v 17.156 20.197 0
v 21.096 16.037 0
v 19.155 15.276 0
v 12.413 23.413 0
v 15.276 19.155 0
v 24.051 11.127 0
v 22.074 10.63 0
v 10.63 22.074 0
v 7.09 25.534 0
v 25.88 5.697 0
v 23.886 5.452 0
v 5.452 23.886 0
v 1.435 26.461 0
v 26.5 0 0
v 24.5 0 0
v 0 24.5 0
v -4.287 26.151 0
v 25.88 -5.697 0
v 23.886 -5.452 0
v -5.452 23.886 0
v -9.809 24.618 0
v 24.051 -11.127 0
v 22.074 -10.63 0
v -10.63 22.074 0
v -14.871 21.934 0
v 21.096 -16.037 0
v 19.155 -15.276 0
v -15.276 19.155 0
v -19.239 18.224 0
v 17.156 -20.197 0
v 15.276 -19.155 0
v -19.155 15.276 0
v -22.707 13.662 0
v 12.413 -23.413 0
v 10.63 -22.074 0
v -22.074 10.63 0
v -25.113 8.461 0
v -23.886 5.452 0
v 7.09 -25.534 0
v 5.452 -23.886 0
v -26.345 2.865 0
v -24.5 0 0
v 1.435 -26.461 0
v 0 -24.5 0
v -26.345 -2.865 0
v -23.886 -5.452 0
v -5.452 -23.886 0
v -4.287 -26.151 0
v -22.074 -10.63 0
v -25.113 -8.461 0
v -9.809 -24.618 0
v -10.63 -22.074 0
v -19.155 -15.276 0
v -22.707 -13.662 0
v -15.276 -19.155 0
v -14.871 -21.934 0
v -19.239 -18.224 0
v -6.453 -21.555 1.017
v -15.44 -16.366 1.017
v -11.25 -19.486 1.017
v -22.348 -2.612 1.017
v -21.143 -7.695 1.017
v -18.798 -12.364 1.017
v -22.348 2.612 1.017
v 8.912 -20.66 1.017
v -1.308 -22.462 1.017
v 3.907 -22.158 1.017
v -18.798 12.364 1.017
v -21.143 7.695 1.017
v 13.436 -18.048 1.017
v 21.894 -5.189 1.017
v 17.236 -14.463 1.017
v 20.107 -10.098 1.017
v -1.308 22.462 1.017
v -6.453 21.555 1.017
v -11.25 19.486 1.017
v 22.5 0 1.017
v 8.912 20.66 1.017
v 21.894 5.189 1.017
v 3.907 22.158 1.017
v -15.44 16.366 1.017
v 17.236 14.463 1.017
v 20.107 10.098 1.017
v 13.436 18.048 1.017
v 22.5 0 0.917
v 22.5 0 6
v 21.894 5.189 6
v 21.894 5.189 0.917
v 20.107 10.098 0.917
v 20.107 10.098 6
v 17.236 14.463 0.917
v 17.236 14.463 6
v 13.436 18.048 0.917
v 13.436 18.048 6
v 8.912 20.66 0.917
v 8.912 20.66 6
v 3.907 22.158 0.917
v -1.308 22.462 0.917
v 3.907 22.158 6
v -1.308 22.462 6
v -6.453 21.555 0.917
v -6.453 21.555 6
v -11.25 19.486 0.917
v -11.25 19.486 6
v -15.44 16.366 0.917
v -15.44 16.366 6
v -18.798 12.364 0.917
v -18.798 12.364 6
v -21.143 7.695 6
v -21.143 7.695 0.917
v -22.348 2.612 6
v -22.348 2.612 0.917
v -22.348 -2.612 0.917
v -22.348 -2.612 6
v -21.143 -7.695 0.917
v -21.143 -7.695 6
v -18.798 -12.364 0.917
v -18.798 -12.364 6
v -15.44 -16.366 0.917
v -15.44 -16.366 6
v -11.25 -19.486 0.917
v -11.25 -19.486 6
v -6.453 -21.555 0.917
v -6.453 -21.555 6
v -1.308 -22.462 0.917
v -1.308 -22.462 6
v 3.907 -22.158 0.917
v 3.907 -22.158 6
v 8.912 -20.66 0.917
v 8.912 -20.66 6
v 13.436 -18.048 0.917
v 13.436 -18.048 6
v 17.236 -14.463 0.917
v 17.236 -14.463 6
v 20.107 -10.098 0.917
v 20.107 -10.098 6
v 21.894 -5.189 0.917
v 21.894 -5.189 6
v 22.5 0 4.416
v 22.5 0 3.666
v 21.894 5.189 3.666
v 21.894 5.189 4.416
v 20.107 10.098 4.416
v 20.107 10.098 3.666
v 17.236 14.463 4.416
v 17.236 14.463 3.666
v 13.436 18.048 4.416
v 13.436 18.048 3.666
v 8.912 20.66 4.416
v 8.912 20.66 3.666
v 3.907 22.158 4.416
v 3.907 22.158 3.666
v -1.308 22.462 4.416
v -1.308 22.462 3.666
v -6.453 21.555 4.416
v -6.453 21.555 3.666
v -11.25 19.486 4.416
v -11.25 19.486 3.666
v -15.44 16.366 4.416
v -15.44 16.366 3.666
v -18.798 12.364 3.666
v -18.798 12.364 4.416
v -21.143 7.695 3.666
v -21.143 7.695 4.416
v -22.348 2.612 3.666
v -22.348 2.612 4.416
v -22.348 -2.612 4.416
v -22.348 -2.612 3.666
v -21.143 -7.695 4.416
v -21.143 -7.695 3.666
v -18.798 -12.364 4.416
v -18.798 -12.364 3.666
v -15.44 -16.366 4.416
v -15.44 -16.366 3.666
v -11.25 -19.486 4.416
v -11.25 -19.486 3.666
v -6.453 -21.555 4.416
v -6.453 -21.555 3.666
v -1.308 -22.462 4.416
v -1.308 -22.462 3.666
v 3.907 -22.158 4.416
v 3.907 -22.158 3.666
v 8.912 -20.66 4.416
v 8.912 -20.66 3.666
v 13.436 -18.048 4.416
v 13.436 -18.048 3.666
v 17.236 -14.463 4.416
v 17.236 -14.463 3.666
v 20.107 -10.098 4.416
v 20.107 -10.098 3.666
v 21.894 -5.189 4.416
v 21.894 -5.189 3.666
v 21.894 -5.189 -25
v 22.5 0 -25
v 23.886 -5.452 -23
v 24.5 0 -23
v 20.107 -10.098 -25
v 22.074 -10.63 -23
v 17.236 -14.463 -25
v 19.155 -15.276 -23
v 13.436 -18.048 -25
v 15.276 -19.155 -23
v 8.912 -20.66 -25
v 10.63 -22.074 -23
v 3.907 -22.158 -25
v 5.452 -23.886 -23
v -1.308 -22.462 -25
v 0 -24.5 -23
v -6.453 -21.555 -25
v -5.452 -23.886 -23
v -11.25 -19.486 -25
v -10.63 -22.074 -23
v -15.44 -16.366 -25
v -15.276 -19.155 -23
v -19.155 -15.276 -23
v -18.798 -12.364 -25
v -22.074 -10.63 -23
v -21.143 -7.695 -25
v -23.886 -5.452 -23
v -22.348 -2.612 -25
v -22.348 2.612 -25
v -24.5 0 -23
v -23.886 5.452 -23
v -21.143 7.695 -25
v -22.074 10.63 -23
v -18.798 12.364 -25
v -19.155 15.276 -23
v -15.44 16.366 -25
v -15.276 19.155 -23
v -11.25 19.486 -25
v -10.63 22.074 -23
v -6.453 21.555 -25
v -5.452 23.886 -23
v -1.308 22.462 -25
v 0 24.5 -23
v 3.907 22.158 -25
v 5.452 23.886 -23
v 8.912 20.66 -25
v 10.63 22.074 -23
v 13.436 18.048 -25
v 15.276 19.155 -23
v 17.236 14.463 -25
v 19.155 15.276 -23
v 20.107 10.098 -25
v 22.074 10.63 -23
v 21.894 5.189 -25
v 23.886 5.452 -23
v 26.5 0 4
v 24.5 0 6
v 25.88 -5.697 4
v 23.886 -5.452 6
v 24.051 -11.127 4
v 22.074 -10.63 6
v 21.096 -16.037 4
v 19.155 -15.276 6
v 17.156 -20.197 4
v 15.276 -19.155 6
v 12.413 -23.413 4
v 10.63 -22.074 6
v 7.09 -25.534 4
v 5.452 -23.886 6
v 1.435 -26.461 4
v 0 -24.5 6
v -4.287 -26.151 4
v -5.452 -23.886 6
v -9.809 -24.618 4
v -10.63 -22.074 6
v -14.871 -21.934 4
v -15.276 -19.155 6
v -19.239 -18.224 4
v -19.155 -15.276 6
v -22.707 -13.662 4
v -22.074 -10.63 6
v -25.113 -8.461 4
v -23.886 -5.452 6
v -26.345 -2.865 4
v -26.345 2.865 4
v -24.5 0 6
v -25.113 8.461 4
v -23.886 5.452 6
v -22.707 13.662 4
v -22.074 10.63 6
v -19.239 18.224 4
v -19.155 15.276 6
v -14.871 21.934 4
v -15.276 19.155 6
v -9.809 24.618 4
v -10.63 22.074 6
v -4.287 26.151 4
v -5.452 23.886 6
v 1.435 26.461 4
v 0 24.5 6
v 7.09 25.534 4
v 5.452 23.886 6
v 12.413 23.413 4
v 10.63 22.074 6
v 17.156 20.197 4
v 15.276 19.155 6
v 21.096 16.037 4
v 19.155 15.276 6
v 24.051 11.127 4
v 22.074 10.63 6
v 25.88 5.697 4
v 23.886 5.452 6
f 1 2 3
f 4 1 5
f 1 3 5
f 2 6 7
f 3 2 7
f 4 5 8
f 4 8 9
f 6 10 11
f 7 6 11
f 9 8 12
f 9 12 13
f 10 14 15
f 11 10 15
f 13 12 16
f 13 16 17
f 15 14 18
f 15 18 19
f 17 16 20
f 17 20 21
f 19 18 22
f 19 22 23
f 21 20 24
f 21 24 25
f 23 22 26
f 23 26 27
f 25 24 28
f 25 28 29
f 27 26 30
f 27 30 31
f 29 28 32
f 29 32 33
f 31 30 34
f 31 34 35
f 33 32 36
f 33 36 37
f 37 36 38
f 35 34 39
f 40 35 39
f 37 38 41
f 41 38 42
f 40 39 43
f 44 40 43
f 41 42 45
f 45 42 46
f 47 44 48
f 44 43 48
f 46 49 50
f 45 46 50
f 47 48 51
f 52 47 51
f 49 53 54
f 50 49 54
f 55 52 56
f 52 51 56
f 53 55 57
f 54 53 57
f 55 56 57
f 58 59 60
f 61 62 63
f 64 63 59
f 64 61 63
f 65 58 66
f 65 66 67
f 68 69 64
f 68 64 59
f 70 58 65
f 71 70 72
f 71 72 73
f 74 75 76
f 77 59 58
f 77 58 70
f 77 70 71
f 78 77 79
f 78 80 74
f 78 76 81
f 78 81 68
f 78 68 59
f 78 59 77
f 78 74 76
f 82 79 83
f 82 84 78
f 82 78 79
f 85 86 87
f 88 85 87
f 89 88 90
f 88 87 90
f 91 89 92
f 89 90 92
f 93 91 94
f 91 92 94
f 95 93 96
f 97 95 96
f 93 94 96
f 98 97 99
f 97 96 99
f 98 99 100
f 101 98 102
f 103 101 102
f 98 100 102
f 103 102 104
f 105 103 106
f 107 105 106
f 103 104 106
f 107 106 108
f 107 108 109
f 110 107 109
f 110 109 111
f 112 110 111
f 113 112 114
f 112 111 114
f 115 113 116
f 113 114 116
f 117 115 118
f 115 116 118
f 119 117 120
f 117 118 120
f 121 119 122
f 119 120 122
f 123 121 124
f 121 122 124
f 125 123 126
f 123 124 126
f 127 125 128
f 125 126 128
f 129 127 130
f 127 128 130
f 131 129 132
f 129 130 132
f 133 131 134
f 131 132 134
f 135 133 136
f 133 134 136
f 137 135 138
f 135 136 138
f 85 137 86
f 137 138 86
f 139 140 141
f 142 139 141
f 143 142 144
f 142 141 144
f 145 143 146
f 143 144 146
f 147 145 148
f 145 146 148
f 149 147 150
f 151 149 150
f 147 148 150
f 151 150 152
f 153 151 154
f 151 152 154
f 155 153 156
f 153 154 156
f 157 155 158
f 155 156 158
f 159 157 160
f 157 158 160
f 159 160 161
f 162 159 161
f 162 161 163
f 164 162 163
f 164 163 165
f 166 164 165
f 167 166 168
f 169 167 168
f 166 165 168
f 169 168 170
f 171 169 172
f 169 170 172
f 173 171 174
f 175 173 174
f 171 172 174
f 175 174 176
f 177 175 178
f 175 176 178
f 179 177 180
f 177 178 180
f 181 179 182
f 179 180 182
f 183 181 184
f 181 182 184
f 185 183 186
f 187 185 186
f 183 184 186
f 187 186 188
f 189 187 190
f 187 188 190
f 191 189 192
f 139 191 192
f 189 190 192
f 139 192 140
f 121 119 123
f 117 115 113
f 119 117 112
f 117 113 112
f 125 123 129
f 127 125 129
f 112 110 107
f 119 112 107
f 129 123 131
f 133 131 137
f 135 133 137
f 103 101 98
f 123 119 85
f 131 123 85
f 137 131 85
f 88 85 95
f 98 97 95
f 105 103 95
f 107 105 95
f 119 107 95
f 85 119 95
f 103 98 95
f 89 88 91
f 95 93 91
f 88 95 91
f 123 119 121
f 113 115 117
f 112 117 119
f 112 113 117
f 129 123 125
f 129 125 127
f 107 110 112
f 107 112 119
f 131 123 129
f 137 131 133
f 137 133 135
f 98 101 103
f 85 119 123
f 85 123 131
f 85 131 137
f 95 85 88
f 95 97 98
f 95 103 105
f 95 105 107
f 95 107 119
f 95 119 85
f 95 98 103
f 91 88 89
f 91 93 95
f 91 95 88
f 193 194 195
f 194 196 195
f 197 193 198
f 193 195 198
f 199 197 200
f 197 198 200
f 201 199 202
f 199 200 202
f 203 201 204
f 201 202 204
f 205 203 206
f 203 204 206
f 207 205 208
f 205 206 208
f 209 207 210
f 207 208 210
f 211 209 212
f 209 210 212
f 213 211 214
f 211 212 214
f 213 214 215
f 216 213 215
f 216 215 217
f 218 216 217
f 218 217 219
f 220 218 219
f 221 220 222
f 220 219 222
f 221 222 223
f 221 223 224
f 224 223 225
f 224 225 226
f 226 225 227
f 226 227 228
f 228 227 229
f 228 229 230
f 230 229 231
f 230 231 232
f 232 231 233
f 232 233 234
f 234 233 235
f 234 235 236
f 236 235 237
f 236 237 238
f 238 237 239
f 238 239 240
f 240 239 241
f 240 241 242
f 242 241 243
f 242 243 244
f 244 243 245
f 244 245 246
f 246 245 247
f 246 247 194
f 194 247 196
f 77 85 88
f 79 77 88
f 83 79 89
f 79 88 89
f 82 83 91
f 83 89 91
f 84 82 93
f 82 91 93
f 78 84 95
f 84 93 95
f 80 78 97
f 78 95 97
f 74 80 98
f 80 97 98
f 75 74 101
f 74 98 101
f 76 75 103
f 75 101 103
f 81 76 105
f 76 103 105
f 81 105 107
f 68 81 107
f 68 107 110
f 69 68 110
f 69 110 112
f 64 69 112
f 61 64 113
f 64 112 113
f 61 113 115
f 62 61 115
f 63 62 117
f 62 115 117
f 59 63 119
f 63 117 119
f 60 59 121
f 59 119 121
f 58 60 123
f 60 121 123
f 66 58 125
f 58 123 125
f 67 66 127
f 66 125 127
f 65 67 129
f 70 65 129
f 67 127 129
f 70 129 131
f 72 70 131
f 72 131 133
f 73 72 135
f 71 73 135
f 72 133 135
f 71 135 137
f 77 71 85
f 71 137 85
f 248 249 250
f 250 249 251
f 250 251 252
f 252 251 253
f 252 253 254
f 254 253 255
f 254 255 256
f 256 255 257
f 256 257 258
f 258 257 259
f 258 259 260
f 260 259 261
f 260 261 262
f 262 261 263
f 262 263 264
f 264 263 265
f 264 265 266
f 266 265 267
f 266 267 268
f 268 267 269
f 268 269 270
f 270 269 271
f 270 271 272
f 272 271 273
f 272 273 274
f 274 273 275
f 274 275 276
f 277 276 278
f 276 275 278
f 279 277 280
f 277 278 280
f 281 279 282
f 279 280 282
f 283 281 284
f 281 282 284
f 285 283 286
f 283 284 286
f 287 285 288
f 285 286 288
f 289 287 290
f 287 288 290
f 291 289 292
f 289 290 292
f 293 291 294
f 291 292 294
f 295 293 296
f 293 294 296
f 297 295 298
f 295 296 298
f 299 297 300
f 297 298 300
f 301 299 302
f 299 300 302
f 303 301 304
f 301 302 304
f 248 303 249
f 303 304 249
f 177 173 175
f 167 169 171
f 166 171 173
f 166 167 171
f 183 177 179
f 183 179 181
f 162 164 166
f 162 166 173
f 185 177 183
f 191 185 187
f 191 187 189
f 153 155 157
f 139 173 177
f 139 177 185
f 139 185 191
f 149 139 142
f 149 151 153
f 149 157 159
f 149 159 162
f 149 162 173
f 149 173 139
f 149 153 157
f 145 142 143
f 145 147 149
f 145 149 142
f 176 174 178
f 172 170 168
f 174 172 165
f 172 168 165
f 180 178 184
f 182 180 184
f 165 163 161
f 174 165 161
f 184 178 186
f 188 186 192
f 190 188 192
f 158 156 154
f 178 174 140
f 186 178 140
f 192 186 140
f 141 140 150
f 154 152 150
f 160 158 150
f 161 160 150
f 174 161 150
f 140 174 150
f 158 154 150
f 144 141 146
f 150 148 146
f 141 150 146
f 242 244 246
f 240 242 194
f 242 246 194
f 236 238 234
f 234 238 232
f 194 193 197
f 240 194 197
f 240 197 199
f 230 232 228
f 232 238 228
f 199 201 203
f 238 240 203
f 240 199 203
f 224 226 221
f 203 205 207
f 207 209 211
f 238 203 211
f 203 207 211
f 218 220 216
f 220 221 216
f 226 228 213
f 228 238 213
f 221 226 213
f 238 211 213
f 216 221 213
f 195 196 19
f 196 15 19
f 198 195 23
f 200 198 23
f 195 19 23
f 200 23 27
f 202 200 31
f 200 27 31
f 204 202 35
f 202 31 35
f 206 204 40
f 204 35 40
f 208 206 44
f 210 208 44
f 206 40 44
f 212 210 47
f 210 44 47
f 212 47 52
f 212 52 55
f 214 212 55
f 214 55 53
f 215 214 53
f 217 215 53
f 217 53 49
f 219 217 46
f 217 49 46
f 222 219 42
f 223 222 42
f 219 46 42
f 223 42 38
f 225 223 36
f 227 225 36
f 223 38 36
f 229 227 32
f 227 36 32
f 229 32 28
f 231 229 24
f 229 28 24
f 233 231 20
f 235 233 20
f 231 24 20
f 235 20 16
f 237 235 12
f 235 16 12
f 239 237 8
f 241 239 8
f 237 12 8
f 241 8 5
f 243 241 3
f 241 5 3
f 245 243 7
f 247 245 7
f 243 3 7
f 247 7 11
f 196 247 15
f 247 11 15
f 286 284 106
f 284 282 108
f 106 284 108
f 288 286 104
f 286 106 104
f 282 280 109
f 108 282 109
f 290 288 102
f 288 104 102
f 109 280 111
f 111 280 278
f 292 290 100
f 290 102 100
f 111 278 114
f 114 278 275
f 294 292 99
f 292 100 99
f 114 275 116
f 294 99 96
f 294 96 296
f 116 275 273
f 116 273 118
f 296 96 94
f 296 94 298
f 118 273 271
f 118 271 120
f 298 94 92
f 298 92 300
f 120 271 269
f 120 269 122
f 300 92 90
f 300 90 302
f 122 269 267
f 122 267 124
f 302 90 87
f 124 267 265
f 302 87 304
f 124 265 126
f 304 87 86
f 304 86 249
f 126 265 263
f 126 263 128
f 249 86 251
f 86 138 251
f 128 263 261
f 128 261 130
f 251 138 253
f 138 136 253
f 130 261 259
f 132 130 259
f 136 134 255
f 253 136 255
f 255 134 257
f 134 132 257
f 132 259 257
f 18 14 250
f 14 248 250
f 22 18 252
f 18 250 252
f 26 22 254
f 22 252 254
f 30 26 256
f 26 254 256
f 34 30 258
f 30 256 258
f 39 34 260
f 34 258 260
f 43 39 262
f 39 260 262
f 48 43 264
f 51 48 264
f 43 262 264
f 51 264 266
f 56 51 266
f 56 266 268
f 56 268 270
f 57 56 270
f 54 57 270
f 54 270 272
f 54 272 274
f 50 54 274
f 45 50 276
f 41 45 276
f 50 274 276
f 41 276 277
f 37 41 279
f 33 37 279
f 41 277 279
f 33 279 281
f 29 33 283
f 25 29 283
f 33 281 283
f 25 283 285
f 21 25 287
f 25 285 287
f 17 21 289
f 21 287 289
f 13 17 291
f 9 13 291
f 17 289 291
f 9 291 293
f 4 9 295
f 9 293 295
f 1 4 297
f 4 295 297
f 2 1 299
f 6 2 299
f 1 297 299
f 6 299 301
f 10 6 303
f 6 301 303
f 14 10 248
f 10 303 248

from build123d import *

# Parameters (mm, degrees)
F2_R     = 22.5
F3_DEPTH = 5.0832424313
F4_R     = 22.5
F5_DEPTH = 0.1
F7_R     = 22.5
F8_DEPTH = 0.75


with BuildPart() as f1:
    # F0 (on Front) → F1 (revolve)
    with BuildSketch(Plane.XZ):
        Polygon((0, 6), (0, -25), (22.5, -25), (24.5, -23), (24.5, 0), (26.5, 0), (26.5, 4), (24.5, 6), align=None)
    revolve(axis=Axis((0, 0, -9.5), (0, 0, -1)))

    # F2 (on face) → F3 (cut)
    with BuildSketch(Plane.XY.offset(6)):
        Circle(F2_R)
    extrude(amount=-F3_DEPTH, mode=Mode.SUBTRACT)


with BuildPart() as f5:
    # F4 (on face) → F5 (new body)
    with BuildSketch(Plane.XY.offset(0.9167575687)):
        Circle(F4_R)
    extrude(amount=F5_DEPTH)


with BuildPart() as f8:
    # F7 (on offset) → F8 (new body)
    with BuildSketch(Plane.XY.offset(3.6660126656)):
        Circle(F7_R)
    extrude(amount=F8_DEPTH)


solid = Compound([f1.part, f5.part, f8.part])
